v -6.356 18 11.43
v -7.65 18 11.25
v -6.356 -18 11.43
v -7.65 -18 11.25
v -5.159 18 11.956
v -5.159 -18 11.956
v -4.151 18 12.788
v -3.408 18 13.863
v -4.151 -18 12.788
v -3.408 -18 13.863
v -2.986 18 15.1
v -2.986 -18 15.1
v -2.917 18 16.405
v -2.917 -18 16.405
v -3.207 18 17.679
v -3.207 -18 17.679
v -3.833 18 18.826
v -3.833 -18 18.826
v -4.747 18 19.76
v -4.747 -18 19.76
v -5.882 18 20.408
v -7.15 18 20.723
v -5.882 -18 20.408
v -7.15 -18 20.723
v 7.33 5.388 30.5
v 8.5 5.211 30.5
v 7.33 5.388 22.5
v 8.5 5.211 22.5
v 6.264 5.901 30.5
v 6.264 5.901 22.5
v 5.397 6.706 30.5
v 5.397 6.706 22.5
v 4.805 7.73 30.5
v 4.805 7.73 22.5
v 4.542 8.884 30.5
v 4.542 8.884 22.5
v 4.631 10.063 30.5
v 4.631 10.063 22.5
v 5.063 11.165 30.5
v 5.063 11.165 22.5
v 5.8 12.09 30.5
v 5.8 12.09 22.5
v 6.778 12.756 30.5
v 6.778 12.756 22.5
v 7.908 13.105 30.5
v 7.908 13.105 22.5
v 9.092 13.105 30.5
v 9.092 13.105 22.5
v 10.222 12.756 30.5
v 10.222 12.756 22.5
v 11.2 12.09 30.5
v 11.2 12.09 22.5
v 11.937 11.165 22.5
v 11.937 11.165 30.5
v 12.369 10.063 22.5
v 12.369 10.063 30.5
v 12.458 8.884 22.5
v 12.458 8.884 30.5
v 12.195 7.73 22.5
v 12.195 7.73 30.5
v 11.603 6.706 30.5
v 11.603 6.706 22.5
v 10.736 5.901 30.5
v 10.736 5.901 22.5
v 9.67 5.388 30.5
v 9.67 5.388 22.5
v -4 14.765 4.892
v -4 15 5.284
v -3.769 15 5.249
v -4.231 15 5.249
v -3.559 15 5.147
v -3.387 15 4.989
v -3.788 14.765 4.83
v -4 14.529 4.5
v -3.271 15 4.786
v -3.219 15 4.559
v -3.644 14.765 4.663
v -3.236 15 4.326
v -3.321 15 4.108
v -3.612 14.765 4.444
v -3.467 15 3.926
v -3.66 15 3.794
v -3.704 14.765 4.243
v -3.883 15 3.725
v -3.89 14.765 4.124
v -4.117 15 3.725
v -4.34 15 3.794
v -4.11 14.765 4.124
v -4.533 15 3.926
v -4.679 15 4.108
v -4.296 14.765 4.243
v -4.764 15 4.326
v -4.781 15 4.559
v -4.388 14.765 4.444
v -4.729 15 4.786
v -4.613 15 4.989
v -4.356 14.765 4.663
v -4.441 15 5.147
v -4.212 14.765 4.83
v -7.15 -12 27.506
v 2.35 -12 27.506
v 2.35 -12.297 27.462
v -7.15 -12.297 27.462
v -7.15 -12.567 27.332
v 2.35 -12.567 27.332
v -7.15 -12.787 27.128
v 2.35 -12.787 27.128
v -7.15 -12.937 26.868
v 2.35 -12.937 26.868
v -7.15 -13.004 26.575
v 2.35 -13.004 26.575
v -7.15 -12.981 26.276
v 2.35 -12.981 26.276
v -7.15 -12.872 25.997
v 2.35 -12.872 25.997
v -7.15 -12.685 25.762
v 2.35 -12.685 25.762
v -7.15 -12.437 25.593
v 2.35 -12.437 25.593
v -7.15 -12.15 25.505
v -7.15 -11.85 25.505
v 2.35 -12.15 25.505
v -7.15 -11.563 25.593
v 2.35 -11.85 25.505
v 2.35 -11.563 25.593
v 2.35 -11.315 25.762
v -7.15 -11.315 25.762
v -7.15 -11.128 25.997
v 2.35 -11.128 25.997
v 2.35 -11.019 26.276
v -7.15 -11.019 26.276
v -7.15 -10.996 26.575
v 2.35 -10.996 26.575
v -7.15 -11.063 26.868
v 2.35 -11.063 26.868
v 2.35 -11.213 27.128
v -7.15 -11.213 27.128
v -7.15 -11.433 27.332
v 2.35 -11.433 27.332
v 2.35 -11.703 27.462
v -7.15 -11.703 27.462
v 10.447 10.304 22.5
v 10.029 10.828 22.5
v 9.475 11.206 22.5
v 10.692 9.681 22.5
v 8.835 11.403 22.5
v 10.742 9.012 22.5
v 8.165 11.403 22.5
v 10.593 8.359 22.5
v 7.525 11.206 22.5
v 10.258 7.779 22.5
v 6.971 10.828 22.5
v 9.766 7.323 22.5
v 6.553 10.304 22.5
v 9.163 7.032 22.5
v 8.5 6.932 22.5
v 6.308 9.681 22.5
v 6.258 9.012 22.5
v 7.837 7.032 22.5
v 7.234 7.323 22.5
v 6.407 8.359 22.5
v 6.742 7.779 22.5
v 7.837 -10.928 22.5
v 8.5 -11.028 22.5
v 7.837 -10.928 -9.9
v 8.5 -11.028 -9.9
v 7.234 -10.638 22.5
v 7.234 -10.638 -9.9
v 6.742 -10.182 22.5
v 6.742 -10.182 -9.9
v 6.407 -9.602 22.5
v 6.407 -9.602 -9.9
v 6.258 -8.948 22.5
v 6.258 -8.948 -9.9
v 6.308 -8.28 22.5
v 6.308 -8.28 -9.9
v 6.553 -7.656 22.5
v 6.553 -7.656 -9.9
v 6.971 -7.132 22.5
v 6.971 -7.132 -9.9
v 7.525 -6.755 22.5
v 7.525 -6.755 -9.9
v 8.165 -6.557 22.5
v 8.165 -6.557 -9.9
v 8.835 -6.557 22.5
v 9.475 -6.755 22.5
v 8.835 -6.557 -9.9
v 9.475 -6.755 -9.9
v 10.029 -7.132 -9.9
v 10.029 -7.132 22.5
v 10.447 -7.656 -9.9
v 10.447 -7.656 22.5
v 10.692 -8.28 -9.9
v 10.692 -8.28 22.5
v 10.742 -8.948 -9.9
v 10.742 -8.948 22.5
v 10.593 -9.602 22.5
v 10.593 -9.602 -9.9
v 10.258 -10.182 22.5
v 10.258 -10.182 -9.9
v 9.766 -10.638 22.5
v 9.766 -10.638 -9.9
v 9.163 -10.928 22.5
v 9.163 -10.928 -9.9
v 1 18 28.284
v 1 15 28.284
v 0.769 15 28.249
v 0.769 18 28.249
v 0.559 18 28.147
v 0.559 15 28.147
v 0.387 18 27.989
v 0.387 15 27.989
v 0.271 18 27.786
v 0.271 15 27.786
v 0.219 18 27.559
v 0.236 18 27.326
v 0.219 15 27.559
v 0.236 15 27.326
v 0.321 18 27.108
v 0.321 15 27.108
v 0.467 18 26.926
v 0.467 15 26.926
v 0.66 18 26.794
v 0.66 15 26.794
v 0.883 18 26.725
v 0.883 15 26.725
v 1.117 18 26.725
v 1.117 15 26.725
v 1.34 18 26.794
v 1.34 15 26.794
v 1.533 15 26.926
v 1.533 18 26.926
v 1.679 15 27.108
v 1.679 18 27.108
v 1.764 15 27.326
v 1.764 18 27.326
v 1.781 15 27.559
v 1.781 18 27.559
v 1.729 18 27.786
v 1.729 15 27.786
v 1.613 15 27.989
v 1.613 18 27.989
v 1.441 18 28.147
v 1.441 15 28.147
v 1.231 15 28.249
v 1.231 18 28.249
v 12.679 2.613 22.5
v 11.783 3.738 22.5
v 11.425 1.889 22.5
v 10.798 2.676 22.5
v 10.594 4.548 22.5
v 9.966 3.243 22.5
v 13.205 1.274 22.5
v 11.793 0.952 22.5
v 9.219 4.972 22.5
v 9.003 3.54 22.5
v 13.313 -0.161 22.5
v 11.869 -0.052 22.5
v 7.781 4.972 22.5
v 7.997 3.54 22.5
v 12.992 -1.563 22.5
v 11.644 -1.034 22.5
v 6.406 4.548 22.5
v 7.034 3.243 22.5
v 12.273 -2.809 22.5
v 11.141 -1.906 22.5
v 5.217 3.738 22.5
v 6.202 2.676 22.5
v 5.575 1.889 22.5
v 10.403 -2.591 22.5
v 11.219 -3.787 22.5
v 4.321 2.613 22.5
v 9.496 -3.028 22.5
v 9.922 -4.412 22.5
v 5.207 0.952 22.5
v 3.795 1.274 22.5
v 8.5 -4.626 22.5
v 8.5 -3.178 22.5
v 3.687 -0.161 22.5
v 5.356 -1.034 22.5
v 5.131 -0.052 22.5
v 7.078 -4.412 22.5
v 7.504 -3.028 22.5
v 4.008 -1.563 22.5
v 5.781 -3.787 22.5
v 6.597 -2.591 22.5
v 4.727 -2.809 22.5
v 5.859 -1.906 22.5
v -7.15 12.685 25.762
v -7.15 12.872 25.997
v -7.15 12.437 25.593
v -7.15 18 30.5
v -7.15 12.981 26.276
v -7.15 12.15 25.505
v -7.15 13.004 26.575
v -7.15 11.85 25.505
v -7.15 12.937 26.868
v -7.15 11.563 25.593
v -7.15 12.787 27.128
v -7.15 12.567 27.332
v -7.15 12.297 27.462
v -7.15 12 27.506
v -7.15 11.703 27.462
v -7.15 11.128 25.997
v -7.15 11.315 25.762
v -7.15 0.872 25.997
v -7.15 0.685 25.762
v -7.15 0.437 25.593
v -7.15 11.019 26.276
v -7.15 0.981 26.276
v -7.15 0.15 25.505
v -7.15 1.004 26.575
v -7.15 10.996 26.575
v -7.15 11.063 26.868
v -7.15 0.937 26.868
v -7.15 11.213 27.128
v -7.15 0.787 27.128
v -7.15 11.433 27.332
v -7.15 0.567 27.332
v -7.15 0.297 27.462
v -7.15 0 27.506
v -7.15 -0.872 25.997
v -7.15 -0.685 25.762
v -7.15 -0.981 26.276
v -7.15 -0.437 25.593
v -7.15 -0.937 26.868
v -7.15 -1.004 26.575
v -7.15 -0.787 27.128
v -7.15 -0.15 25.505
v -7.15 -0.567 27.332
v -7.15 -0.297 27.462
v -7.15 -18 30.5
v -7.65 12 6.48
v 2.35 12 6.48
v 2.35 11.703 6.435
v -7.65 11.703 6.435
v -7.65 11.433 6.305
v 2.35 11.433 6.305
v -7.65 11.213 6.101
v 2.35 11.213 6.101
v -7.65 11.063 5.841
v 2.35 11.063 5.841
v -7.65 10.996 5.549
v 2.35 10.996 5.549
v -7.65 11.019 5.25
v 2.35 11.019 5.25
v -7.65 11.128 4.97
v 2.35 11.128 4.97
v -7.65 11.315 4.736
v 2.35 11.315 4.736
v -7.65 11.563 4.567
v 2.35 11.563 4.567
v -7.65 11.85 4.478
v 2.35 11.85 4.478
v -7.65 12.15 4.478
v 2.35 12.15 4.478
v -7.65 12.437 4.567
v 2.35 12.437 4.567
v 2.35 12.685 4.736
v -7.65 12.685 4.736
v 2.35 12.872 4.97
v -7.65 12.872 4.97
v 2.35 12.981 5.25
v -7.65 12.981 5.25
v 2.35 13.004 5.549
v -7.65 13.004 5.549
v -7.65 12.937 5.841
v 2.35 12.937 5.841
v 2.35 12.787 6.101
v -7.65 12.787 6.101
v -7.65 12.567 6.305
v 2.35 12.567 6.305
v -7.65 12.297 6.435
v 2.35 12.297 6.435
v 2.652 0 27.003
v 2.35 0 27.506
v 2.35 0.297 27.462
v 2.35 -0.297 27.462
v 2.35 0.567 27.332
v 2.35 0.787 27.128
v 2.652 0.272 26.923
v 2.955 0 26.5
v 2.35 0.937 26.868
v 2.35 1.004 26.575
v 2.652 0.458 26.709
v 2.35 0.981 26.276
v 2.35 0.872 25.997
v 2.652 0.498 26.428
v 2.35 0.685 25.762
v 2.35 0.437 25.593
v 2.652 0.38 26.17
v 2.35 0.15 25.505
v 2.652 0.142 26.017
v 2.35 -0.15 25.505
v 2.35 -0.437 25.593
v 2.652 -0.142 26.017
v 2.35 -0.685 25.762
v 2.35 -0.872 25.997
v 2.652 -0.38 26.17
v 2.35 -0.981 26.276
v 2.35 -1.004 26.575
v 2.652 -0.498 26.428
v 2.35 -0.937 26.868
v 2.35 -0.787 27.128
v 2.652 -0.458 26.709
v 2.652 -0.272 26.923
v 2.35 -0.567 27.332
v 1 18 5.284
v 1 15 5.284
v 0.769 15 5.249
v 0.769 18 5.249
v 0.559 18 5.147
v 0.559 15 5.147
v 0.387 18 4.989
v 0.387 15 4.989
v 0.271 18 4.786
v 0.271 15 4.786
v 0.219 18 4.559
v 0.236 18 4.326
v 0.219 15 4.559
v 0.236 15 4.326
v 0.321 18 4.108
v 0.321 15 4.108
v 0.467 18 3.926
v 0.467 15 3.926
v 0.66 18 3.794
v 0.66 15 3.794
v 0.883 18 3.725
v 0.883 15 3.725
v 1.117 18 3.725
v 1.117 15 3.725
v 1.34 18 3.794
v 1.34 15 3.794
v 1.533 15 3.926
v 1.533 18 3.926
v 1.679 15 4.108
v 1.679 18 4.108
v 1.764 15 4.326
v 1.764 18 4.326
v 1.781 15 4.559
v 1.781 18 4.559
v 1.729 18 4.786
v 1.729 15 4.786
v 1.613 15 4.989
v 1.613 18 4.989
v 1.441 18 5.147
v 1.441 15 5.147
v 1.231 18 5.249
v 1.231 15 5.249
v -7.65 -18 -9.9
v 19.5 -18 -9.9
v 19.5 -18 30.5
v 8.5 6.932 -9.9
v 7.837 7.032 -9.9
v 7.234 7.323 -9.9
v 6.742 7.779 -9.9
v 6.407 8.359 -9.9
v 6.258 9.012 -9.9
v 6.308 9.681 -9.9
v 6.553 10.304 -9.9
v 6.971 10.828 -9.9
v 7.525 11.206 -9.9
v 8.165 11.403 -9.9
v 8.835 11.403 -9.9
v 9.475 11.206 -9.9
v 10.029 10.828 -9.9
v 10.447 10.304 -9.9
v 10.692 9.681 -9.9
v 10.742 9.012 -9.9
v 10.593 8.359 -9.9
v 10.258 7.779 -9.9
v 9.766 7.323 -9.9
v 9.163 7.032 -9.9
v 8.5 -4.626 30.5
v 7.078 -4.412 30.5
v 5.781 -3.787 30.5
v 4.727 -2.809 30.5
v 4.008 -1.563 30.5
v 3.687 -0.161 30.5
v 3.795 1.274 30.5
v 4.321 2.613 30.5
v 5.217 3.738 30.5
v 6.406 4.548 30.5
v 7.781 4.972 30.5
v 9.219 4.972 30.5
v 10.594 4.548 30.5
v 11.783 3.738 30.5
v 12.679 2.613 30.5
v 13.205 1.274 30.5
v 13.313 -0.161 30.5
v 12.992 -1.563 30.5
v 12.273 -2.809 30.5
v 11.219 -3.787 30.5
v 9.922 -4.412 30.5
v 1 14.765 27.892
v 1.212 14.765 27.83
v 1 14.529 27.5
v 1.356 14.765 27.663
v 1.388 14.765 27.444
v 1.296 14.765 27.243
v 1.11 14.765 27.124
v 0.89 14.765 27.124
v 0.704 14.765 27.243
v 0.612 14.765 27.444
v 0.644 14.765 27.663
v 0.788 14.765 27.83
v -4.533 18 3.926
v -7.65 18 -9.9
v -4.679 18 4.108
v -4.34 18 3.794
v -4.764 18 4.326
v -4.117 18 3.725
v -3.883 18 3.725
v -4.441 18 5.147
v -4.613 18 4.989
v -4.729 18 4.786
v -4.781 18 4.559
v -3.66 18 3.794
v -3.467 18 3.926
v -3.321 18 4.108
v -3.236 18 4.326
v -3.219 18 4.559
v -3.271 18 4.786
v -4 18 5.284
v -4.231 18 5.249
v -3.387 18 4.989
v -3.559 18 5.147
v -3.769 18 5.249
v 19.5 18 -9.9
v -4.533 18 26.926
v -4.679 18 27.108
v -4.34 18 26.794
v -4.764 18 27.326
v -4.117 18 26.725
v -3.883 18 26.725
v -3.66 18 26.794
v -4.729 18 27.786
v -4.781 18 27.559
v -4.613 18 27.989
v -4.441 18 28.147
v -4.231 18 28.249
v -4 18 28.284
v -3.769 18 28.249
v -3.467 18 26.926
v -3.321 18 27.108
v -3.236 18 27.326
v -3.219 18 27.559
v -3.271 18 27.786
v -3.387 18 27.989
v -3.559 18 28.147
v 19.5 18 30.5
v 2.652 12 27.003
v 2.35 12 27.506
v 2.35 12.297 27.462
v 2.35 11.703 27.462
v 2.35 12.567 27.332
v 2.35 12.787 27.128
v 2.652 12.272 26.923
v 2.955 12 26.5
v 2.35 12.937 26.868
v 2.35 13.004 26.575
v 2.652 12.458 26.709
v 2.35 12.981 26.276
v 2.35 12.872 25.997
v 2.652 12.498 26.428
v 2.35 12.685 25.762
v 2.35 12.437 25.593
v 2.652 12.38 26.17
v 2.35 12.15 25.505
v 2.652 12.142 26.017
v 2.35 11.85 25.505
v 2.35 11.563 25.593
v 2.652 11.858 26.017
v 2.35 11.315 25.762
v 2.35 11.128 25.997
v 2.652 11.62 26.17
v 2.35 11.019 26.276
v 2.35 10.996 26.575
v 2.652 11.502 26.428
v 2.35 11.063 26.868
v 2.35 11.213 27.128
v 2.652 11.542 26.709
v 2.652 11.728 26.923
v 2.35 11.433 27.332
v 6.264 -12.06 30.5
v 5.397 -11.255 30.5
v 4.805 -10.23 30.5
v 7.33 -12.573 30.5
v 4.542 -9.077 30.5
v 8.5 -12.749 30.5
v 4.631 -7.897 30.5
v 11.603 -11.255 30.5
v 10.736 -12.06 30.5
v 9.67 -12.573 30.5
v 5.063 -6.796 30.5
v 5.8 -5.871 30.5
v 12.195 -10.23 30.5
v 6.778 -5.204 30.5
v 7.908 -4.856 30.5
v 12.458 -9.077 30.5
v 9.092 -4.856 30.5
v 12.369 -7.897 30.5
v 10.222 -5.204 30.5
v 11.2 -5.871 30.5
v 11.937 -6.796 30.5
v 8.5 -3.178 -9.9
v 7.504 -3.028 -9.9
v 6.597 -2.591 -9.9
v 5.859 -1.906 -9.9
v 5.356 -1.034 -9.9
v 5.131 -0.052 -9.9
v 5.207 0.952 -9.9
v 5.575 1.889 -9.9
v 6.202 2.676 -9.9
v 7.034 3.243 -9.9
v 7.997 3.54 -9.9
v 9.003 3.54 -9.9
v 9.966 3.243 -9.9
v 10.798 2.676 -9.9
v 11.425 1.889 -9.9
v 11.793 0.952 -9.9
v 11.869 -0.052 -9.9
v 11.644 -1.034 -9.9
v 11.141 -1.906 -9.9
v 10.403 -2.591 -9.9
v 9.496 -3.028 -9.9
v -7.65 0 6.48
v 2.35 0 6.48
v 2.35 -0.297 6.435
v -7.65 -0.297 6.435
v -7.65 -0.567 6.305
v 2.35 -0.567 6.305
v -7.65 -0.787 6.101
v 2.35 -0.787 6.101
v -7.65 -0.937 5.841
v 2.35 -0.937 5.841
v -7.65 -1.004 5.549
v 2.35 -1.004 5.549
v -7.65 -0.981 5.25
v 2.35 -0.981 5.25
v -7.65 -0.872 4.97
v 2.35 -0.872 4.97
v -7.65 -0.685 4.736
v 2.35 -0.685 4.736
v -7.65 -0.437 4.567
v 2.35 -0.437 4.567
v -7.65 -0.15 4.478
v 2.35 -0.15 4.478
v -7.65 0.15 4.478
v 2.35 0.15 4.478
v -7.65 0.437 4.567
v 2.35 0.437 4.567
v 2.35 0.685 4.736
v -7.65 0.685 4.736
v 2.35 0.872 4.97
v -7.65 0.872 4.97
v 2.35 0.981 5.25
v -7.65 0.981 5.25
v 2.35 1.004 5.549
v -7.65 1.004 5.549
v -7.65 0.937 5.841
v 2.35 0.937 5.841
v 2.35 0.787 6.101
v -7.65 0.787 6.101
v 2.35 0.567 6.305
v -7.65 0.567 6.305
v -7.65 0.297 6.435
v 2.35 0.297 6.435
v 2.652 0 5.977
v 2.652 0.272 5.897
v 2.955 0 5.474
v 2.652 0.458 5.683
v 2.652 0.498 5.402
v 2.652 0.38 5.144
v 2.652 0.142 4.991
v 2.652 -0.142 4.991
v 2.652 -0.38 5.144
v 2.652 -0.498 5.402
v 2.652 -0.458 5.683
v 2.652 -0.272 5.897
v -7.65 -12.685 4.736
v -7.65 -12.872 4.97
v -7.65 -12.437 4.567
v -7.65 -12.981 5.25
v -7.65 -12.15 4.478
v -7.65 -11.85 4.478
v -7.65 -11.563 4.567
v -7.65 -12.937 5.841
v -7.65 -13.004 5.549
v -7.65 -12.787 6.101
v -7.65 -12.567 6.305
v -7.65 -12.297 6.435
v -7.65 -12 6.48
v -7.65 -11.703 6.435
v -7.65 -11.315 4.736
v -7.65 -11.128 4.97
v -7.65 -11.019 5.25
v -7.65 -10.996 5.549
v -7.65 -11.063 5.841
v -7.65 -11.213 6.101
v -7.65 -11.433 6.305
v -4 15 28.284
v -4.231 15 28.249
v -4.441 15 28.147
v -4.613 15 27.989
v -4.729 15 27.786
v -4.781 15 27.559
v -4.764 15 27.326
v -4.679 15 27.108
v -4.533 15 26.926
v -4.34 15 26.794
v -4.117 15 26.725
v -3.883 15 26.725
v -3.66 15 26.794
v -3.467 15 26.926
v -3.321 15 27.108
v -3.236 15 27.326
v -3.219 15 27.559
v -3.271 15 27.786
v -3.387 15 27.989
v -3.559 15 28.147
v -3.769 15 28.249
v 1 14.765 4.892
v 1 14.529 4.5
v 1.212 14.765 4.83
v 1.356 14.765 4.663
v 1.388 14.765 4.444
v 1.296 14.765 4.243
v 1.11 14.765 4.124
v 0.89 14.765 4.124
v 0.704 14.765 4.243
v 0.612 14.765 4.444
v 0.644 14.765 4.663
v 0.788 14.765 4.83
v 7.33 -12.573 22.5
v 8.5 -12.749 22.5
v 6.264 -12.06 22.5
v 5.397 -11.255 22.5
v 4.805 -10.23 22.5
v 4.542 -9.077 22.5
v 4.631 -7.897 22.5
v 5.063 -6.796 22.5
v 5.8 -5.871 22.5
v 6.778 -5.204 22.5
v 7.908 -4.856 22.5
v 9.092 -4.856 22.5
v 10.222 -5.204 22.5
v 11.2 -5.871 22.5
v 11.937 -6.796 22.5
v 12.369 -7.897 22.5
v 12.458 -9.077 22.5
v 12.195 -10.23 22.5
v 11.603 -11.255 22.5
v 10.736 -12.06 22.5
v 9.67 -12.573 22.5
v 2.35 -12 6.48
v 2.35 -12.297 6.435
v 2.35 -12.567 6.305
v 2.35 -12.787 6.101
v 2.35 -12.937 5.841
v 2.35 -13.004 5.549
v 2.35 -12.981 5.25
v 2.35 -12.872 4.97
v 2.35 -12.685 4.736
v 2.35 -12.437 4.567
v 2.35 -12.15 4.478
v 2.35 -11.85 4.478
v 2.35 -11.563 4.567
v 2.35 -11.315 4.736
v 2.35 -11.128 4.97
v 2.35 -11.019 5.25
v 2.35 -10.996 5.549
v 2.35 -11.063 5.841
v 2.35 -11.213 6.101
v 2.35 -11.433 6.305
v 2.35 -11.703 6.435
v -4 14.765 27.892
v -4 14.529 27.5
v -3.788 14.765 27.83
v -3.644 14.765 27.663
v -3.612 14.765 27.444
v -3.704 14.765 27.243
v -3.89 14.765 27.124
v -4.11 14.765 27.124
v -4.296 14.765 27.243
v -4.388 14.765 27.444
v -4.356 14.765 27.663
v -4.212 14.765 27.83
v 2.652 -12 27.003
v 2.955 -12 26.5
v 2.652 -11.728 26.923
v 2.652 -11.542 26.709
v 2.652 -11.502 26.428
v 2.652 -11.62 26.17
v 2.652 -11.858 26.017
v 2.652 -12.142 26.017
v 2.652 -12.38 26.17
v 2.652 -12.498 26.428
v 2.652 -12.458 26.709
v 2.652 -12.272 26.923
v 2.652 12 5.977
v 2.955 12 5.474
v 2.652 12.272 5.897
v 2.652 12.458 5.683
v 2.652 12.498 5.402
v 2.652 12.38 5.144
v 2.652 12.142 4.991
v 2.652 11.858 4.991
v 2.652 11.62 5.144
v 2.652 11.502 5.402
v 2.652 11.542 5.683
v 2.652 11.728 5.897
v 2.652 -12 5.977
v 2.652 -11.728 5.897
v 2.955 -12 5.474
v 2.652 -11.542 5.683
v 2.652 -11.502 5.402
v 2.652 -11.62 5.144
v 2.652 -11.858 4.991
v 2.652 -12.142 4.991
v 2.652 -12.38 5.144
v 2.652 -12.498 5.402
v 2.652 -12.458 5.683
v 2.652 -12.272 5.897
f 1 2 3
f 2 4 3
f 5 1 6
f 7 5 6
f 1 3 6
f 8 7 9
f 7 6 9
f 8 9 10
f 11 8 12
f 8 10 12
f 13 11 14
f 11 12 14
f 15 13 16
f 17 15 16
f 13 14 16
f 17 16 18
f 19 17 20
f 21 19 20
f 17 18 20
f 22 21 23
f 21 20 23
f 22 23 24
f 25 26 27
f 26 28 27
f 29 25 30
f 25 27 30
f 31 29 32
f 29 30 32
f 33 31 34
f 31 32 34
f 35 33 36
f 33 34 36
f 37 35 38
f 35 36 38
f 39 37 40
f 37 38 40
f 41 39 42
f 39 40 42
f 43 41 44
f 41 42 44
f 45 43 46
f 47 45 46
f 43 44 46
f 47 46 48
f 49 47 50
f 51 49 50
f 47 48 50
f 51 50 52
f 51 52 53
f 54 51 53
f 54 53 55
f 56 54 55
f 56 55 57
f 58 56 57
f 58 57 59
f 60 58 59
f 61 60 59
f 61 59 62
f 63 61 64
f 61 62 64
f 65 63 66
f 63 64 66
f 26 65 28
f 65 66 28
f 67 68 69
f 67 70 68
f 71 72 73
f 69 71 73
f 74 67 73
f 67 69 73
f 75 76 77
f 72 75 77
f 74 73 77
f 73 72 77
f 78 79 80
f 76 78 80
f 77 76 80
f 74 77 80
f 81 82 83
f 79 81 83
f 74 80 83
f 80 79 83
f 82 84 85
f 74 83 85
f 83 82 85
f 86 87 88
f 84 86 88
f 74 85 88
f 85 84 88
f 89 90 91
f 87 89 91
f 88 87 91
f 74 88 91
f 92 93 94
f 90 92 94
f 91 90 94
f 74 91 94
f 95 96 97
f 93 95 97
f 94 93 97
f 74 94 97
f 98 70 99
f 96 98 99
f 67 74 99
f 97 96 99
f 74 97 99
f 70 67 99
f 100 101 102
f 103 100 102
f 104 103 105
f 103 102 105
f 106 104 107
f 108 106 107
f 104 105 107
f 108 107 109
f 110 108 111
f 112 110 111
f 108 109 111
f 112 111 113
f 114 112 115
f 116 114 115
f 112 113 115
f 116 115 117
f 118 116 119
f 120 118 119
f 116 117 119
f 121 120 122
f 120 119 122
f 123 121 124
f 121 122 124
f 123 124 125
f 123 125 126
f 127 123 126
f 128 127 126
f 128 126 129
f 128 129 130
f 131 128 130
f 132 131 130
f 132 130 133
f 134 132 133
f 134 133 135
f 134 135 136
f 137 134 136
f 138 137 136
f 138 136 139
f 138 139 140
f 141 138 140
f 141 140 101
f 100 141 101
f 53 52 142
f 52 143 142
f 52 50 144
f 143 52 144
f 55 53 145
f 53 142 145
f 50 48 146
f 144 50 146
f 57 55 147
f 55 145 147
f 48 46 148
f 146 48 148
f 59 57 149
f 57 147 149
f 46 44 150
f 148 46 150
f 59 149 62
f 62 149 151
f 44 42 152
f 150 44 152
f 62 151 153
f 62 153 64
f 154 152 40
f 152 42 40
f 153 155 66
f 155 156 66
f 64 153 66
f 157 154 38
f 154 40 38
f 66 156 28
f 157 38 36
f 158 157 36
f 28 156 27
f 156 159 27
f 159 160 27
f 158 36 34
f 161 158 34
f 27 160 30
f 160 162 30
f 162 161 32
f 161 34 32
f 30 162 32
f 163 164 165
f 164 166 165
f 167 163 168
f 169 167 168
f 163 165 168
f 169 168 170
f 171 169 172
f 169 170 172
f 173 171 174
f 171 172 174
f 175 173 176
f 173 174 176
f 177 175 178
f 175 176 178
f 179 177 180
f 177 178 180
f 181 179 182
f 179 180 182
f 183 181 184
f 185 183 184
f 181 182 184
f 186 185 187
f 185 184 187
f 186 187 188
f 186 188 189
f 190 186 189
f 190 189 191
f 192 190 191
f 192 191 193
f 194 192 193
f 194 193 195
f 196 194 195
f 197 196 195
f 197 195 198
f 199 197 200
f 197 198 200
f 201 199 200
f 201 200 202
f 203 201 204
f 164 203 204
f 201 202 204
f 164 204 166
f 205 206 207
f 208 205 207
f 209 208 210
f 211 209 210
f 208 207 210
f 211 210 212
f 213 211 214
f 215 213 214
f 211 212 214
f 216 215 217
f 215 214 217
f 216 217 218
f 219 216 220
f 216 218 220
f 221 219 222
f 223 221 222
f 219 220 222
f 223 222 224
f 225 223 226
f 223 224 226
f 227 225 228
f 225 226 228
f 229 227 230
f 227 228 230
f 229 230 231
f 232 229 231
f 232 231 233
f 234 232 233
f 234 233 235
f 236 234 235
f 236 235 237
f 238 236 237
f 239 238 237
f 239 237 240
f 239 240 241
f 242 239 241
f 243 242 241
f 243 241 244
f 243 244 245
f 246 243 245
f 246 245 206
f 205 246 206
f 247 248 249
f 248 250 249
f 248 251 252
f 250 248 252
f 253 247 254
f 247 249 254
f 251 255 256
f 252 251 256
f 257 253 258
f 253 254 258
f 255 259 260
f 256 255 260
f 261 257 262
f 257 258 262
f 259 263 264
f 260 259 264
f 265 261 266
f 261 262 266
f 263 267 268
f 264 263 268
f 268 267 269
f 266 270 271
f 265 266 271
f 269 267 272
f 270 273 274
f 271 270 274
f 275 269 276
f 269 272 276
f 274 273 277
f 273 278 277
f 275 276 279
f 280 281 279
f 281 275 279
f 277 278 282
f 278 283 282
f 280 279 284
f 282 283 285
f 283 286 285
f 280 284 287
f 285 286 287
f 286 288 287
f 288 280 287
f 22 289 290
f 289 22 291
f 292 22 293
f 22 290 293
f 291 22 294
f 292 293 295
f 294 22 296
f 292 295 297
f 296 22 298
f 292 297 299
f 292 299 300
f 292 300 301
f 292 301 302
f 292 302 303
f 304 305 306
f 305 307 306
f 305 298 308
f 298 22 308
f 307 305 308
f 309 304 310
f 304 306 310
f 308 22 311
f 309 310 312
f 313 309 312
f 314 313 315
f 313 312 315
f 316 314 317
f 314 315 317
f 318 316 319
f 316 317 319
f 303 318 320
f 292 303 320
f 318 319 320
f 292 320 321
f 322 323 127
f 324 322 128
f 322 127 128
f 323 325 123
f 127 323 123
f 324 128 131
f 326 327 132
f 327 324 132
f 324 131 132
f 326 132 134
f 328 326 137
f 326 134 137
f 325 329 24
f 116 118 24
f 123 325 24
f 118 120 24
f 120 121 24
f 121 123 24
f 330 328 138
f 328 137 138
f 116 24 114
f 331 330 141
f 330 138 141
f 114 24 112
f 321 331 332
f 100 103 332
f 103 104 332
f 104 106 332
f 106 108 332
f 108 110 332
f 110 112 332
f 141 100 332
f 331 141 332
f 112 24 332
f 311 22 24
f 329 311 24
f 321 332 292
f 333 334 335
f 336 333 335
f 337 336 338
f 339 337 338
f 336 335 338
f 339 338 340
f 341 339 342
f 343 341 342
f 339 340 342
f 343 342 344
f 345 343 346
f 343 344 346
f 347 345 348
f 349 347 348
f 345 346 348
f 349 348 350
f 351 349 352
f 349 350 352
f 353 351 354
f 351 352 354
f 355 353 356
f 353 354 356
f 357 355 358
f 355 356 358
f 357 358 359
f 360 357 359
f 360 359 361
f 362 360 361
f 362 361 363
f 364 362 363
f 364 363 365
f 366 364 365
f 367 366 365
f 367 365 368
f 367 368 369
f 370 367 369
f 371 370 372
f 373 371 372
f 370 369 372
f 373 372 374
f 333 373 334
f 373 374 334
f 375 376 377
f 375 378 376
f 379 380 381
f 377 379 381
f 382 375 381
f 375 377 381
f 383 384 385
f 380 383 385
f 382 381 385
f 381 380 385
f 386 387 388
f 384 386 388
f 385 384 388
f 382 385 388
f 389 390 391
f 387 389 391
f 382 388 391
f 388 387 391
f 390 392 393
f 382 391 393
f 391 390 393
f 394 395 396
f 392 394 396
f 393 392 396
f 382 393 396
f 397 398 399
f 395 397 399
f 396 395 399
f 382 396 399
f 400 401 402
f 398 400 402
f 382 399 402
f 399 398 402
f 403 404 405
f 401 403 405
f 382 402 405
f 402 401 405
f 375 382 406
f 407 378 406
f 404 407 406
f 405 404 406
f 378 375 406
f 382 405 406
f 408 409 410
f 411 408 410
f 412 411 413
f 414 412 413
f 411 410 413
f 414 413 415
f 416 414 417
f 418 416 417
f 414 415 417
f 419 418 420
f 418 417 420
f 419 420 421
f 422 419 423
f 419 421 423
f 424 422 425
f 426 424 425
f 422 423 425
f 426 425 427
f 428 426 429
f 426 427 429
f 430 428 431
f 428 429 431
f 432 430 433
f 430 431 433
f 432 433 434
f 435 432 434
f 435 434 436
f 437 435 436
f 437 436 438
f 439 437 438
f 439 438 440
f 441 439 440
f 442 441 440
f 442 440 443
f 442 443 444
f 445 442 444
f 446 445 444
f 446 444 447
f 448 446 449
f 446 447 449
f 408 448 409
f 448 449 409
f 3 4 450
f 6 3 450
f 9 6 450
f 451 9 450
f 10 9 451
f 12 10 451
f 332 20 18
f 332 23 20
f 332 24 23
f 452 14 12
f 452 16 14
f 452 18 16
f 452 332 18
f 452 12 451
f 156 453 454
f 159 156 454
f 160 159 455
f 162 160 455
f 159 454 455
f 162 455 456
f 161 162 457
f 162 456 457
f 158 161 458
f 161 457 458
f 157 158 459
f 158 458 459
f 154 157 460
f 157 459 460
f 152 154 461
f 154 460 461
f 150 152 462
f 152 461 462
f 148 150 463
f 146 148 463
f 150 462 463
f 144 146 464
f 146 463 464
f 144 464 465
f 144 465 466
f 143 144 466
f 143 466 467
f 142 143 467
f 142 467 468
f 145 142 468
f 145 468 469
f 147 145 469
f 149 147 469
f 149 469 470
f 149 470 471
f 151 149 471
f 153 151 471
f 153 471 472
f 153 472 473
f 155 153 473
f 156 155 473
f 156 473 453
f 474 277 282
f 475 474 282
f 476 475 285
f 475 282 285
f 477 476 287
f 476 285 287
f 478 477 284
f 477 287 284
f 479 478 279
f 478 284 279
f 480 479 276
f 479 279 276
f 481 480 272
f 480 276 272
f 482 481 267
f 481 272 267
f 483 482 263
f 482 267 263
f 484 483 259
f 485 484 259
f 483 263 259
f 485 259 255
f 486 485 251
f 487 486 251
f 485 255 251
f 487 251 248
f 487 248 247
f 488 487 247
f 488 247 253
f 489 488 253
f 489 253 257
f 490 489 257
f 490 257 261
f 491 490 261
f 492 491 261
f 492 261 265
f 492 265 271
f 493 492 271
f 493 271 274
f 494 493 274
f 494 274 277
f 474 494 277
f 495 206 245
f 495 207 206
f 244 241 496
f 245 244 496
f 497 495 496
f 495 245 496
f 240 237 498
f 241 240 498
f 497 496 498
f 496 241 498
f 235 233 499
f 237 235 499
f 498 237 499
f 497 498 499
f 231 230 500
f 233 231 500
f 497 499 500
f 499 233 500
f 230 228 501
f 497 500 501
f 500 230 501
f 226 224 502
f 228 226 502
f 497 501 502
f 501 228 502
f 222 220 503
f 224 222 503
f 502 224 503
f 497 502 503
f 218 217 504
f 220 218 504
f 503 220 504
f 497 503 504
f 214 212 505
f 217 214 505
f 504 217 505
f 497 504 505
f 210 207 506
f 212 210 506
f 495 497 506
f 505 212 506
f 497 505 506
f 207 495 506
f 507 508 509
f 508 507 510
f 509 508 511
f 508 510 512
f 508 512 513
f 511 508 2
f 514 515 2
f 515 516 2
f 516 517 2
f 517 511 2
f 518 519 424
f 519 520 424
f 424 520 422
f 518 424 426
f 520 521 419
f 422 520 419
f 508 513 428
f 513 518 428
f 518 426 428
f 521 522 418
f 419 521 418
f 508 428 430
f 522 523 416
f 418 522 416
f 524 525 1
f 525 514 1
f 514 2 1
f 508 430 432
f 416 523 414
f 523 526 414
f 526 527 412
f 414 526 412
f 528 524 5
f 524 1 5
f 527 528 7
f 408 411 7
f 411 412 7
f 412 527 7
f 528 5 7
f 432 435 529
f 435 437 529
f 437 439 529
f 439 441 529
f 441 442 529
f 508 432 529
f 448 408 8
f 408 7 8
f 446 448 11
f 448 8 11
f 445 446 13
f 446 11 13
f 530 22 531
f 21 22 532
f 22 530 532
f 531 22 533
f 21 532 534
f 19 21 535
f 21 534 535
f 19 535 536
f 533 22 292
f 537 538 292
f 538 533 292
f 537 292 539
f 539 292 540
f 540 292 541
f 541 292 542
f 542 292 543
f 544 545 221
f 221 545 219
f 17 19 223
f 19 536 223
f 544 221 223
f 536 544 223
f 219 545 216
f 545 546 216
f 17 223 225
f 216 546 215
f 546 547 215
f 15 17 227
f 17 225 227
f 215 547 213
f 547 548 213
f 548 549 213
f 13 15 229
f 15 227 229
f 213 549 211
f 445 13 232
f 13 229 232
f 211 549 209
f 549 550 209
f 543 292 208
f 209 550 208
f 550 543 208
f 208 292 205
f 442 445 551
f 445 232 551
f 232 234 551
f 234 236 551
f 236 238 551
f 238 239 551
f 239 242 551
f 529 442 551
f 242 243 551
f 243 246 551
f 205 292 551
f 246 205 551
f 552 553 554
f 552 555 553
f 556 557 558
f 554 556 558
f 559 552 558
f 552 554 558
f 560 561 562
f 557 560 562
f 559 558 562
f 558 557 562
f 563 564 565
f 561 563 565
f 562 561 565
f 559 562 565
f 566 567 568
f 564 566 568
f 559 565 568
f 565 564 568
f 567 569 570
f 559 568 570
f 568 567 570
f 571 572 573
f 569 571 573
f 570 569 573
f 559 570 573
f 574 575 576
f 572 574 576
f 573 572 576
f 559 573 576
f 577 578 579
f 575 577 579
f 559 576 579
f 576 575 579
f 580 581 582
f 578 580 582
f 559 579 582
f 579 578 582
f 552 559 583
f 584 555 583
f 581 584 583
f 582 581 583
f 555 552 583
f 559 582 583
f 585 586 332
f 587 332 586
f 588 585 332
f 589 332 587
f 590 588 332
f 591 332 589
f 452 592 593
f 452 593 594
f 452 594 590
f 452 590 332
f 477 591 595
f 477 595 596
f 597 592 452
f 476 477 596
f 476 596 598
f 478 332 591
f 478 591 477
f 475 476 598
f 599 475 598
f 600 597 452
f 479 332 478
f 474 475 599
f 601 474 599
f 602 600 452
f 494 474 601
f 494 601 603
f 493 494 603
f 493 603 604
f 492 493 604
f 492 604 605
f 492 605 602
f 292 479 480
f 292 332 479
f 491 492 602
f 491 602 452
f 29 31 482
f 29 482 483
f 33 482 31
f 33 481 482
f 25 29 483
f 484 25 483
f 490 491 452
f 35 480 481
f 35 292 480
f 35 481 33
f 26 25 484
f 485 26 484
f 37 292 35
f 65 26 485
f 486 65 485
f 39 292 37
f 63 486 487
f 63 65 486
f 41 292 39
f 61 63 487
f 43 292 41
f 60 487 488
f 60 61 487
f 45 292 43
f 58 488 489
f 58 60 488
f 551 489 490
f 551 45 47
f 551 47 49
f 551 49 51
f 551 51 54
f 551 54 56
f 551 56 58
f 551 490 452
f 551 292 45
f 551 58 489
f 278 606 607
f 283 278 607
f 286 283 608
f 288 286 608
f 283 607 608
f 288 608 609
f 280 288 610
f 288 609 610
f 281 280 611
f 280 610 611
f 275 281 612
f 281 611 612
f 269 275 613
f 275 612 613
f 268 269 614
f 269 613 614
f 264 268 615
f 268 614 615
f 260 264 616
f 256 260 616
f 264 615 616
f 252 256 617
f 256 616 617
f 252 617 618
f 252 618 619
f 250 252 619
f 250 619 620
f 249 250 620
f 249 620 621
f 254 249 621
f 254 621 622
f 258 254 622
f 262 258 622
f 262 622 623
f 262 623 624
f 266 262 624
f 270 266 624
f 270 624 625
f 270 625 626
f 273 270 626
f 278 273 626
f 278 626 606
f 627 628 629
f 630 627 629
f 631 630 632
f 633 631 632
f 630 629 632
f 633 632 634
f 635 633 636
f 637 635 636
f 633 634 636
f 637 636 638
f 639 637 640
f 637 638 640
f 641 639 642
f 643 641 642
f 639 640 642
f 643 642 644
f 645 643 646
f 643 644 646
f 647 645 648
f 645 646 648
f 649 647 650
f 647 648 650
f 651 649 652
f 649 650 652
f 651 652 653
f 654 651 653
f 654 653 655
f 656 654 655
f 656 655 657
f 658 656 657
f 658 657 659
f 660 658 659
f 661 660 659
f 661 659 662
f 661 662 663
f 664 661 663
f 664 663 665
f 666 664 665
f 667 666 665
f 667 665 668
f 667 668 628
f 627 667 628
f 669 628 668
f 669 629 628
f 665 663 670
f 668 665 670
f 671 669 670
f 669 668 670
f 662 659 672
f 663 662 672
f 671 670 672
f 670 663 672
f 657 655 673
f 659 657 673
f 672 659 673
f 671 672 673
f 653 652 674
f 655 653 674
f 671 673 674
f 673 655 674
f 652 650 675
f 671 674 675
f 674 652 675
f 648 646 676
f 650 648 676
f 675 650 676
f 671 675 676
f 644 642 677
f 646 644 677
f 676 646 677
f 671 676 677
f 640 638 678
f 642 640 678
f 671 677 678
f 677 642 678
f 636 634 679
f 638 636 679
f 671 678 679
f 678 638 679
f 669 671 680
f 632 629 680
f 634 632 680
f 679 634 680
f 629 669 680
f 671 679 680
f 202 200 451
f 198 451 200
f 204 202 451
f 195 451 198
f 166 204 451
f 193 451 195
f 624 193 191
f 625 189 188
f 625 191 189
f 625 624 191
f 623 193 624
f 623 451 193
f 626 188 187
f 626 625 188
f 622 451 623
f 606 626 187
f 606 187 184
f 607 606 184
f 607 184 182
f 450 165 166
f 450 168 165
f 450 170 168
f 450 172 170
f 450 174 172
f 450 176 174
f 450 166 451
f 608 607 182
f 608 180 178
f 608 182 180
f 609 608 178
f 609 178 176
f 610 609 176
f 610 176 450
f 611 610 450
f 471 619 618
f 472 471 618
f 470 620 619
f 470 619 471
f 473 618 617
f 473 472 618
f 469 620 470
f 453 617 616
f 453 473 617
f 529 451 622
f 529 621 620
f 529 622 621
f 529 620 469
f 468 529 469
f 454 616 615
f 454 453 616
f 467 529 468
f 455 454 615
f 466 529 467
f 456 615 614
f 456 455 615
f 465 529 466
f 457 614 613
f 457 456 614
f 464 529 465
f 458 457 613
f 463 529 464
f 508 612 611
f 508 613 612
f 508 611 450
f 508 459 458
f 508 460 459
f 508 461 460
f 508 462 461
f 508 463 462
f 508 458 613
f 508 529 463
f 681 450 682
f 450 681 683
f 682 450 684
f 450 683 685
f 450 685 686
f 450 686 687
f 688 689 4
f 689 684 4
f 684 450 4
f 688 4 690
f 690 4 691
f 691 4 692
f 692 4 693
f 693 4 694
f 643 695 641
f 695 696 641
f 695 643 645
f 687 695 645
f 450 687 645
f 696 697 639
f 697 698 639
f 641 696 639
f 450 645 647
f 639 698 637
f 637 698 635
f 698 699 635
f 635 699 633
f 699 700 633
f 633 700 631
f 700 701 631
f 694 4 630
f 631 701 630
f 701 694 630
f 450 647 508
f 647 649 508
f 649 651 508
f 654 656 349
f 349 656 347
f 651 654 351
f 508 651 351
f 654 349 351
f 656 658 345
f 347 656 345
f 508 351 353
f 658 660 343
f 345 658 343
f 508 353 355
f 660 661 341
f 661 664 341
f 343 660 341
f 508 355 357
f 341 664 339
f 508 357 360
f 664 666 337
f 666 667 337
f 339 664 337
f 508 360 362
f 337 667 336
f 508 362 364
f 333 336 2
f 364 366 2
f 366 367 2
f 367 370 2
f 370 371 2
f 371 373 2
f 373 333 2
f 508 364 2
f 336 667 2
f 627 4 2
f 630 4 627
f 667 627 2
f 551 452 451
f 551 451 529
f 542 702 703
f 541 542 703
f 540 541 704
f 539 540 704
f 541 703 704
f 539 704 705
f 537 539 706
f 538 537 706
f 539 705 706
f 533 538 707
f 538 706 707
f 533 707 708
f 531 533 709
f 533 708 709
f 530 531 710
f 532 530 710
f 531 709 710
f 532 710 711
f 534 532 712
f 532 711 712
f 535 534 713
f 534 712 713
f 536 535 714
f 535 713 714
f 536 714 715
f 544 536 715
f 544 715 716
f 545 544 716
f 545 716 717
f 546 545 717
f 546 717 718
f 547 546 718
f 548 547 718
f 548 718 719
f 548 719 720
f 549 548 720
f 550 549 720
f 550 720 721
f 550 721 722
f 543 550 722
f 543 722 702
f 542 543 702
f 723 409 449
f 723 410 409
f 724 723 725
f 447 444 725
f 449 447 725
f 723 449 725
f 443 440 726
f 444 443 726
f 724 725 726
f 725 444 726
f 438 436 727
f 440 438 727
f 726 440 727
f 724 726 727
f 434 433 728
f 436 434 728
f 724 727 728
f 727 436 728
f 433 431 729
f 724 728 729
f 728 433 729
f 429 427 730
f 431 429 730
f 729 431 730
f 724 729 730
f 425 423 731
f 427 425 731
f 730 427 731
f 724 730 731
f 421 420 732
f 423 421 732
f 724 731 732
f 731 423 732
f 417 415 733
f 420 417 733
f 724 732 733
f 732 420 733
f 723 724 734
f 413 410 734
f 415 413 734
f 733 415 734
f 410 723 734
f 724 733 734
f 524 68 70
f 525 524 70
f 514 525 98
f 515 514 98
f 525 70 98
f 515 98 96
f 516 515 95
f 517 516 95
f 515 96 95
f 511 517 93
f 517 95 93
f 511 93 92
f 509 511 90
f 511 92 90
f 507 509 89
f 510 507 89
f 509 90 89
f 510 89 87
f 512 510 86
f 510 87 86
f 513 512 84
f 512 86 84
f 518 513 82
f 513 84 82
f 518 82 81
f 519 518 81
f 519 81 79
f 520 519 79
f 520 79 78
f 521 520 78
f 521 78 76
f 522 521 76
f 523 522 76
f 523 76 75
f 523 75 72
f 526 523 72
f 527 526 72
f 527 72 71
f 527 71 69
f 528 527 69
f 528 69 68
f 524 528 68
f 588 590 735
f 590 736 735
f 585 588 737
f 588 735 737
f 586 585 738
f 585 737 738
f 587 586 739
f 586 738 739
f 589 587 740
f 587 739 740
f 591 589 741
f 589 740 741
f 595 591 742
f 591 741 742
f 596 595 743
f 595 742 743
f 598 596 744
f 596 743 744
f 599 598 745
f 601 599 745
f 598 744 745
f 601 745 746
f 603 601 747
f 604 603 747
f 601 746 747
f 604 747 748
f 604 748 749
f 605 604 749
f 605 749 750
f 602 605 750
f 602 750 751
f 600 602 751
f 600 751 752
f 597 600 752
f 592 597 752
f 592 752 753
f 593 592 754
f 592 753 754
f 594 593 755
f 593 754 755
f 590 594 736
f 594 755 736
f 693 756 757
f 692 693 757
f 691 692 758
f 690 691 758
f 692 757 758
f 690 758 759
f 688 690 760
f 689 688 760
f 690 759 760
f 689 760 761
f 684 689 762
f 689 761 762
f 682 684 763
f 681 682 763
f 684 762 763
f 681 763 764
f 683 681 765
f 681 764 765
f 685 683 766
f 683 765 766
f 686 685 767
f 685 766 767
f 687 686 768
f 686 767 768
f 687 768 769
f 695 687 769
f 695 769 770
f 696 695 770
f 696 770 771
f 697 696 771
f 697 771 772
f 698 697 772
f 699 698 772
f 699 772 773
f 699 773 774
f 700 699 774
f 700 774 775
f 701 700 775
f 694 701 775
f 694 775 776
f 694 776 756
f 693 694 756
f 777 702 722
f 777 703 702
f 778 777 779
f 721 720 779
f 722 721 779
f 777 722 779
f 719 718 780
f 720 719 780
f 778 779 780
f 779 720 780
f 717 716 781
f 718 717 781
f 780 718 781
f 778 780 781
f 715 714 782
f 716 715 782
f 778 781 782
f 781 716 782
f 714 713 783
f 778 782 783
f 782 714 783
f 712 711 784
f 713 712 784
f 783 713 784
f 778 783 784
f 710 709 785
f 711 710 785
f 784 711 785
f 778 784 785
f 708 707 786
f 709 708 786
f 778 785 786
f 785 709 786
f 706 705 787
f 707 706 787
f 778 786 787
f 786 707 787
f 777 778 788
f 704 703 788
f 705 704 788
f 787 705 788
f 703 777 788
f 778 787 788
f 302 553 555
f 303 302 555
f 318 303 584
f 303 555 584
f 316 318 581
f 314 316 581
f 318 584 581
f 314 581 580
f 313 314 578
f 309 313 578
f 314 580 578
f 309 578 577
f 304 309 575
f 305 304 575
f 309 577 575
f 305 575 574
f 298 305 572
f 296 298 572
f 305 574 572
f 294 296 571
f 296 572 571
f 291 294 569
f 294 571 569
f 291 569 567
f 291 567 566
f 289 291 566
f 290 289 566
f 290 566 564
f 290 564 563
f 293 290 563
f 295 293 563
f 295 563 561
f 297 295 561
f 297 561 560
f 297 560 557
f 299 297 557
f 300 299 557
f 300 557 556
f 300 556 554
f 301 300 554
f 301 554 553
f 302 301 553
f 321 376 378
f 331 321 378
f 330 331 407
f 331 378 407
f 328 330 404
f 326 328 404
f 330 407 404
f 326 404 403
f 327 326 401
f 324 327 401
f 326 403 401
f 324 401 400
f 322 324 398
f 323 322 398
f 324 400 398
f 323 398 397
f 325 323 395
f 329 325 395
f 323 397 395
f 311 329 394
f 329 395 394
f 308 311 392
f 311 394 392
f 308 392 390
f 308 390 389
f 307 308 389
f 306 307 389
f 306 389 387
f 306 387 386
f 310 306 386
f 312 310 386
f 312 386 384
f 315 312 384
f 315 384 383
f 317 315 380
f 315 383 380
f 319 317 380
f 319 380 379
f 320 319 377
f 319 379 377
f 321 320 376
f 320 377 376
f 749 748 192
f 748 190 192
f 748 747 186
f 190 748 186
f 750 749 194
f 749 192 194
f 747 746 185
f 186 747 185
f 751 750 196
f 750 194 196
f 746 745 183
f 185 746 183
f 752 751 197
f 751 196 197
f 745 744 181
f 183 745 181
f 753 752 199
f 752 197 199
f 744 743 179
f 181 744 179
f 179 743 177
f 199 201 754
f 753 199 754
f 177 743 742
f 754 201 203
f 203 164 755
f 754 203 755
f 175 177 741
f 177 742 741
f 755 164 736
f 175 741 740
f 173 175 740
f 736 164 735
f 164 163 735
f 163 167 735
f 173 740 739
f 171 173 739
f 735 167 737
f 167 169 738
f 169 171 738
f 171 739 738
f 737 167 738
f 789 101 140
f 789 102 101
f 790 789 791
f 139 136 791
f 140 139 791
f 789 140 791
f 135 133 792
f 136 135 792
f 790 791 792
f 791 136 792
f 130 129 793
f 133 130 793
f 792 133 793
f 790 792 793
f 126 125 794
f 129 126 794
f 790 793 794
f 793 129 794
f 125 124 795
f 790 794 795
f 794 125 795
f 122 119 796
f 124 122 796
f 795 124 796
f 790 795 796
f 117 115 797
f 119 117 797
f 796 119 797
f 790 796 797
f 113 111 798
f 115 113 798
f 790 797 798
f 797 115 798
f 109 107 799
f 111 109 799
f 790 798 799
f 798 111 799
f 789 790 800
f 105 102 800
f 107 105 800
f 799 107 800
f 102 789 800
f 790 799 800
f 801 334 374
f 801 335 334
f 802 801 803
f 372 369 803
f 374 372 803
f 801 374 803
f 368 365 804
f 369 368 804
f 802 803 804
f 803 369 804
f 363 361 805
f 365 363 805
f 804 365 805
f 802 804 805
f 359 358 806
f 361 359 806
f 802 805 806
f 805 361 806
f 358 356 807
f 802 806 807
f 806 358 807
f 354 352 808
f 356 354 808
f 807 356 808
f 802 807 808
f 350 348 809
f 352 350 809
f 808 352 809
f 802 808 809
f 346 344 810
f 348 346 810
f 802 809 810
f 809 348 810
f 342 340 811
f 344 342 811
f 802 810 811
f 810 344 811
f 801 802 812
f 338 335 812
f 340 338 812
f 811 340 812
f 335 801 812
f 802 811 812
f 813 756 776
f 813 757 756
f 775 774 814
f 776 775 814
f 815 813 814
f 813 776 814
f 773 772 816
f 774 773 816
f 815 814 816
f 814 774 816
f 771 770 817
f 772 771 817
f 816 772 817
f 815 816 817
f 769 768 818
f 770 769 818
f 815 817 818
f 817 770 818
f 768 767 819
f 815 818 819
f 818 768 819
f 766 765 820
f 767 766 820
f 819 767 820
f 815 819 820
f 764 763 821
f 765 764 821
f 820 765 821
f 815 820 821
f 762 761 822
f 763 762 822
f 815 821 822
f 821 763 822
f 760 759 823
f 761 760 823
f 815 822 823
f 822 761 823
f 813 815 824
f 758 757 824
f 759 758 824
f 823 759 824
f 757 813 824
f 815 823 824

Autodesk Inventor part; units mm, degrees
ref_plane "YZ Plane" through (0, 0, 0) normal (1, 0, 0) x (0, 1, 0)
ref_plane "XZ Plane" through (0, 0, 0) normal (0, 1, 0) x (-1, 0, 0)
ref_plane "XY Plane" through (0, 0, 0) normal (0, 0, 1) x (1, 0, 0)
sketch "Sketch1" plane through (0, 0, 0) normal (0, 0, 1) x (1, 0, 0)
  line L0 (-15.5, 18) -> (19.5, 18)
  line L1 (19.5, 18) -> (19.5, -18)
  line L2 (19.5, -18) -> (-15.5, -18)
  line L3 (-15.5, -18) -> (-15.5, 18)
  point P0 (0, 0)
  dimension "d0" = 35
  dimension "d1" = 36
  dimension "d2" = 18
  dimension "d3" = 15.5
extrude "Extrusion1" add sketch "Sketch1" along normal blind 8
sketch "Sketch2" plane through (0, 0, 8) normal (0, 0, 1) x (1, 0, 0)
  line L0 (-15.5, 18) -> (19.5, 18)
  line L1 (19.5, 18) -> (19.5, -18)
  line L2 (19.5, -18) -> (-15.5, -18)
  line L3 (-15.5, -18) -> (-15.5, 18)
  line L4 (-15.5, -18) -> (-15.5, 18) projected
  line L5 (19.5, 18) -> (19.5, -18) projected
  line L6 (-15.5, 18) -> (19.5, 18) projected
  line L7 (19.5, -18) -> (-15.5, -18) projected
  line L8 (19.5, -18) -> (19.5, 18)
  point P0 (0, 0)
  dimension "d70" = 0
  dimension "d165" = 0
extrude "Extrusion2" add sketch "Sketch2" along normal blind 22.5
sketch "Sketch3" plane through (-15.5, -18, 0) normal (0, -1, 0) x (1, 0, 0)
  line L0 (7.85, 30.5) -> (7.35, 30.5)
  line L1 (7.85, 30.5) -> (8.35, 30.5)
  line L2 (35, 0) -> (0, 0) projected
  arc A0 (7.35, 20.7234) -> (8.35, 20.7234) centre (7.85, 16) ccw
  line L3 (7.35, 30.5) -> (7.35, 20.7234)
  line L4 (8.35, 30.5) -> (8.35, 20.7234)
  line L5 (35, 0) -> (35, 30.5) projected
  line L6 (35, 30.5) -> (0, 30.5) projected
  line L7 (0, 0) -> (0, 30.5) projected
  point P0 (15.5, 0)
  dimension "d16" = 0.5
  dimension "d17" = 0.5
  dimension "d63" = 9.4996
  dimension "d65" = 16
  dimension "d105" = 1
  dimension "d188" = 7.85
  dimension "d189" = 0.5
emboss "Emboss1" sketch "Sketch3" operation cut depth 50 direction (0, 1, 0) contours L1 L4 A0 L3 L0
sketch "Sketch13" plane through (0, 0, 0) normal (0, 0, -1) x (-1, 0, 0)
  line L0 (-13, -5.3) -> (11, -5.3)
  line L1 (15.5, 18) -> (-19.5, 18) projected
  line L2 (-19.5, 18) -> (-19.5, -18) projected
  line L3 (-19.5, -18) -> (15.5, -18) projected
  line L4 (15.5, -18) -> (15.5, 18) projected
  line L5 (-19.5, 18) -> (-19.5, -18) projected
  line L6 (-19.5, -5.3) -> (15.5, -5.3)
  point P0 (0, 0)
  dimension "d190" = 12.7
extrude "Extrusion5" [suppressed]
sketch "Sketch14" plane through (-15.5, -5.3, 0) normal (0, 1, 0) x (1, 0, 0)
  line L0 (0, 32) -> (35, 32) projected
  line L1 (35, 0) -> (35, 32) projected
  point P0 (15.5, 0)
  point P1 (9.5, 30)
  point P2 (28, 30)
  point P3 (32.75, 16)
  dimension "d109" = 2
  dimension "d110" = 2
  dimension "d111" = 2.25
  dimension "d112" = 9.5
  dimension "d113" = 7
  dimension "d114" = 16
hole "Press fit for D2mm_L5mm Dowel - pin to protrude 2mm" [suppressed]
sketch "Sketch21" plane through (0, 0, 0) normal (0, 0, -1) x (-1, 0, 0)
  circle A0 centre (-3.75, 0.2) radius 3
  circle A1 centre (-3.75, 0.2) radius 3 construction
  point P0 (0, 0)
  dimension "d185" = 6
sketch "Sketch22" plane through (-15.5, -18, 30.5) normal (-1, 0, 0) x (0, 0, 1)
  line L0 (-30.5, 36) -> (0, 36) projected
  line L1 (-30.5, 0) -> (-30.5, 36) projected
  line L2 (-30.5, 0) -> (0, 0) projected
  line L3 (0, 0) -> (0, 36) projected
  point P0 (-30.5, 18)
  point P1 (-4, 30)
  point P2 (-4, 18)
  point P3 (-4, 6)
  dimension "d191" = 4
  dimension "d192" = 4
  dimension "d193" = 4
  dimension "d194" = 6
  dimension "d195" = 6
  dimension "d196" = 18
hole "CBore for M2.5 screw" [suppressed]
sketch "Sketch24" plane through (-7.65, -18, 16) normal (0, -1, 0) x (1, 0, 0)
  circle A0 centre (21.4, -42.5) radius 0.7835
  circle A1 centre (21.4, -22.5) radius 0.7835
  circle A2 centre (1.4, -42.5) radius 0.7835
  circle A3 centre (1.4, -22.5) radius 0.7835
  point P0 (7.65, -16)
hole "CBore for M2 screw" [suppressed]
sketch "Sketch25" plane through (-7.65, -18, 16) normal (0, -1, 0) x (1, 0, 0)
  line L0 (-0.5, 4.7234) -> (-0.5, 14.5) projected
  line L1 (-0.5, 14.5) -> (-7.85, 14.5) projected
  line L2 (-7.85, -16) -> (-7.85, 14.5) projected
  line L3 (27.15, -16) -> (27.15, 14.5) projected
  line L4 (27.15, 14.5) -> (0.5, 14.5) projected
  line L5 (0.5, 14.5) -> (0.5, 4.7234) projected
  arc A0 (-0.5, 4.7234) -> (0.5, 4.7234) centre (0, 0) ccw projected
  line L6 (27.15, -48) -> (-7.85, -48) projected
  circle A1 centre (1.4, -42.5) radius 2.2 projected
  circle A2 centre (21.4, -42.5) radius 1.2 projected
  line L7 (1.4, -42.5) -> (21.4, -42.5) construction
  line L8 (11.4, -42.5) -> (11.4, 14.5) construction
  line L9 (0.5, 14.5) -> (27.15, 14.5) projected
  line L10 (27.15, -16) -> (-7.85, -16) projected
  point P0 (7.65, -16)
  point P1 (11.4, -23)
  point P2 (11.4, -40)
hole "Threaded hole for M2 screw" [suppressed]
sketch "Sketch27" plane through (-15.5, 18, 0) normal (0, 1, 0) x (1, 0, 0)
  arc A0 (8.35, -20.7234) -> (7.35, -20.7234) centre (7.85, -16) ccw projected
  line L0 (7.35, -30.5) -> (7.35, -20.7234) projected
  arc A1 (8.35, -20.7234) -> (7.35, -20.7234) centre (7.85, -16) ccw projected
  line L1 (8.35, -20.7234) -> (8.35, -30.5) projected
  line L2 (8.35, -30.5) -> (35, -30.5) projected
  line L3 (35, 0) -> (35, -30.5) projected
  line L4 (0, 0) -> (35, 0) projected
  line L5 (0, 0) -> (0, -30.5) projected
  line L6 (0, -30.5) -> (7.35, -30.5) projected
  line L7 (7.85, -16) -> (7.85, -30.5)
  line L8 (7.85, -30.5) -> (0, -30.5)
  line L9 (0, -30.5) -> (0, 0)
  line L10 (0, 0) -> (7.85, 0)
  line L11 (7.85, 0) -> (7.85, -16)
  point P0 (15.5, 0)
extrude "Extrusion7" cut sketch "Sketch27" against normal through all contours L11 L7 L8 L0 A0 | A0 L0 L6 L5 L4 L11
sketch "Sketch23" plane through (-7.65, -18, 20.7234) normal (-1, 0, 0) x (0, 0, 1)
  line L0 (0, 0) -> (-9.4732, 0) construction
  line L1 (-9.4732, 36) -> (0, 36) construction
  line L2 (-4.7366, 0) -> (-4.7366, 36) construction
  point P0 (-20.7234, 18)
  point P1 (5.7766, 30)
  point P2 (5.7766, 18)
  point P3 (5.7766, 6)
  point P4 (-15.2498, 30)
  point P5 (-15.2498, 18)
  point P6 (-15.2498, 6)
  point P7 (5.7766, 30)
  point P8 (5.7766, 18)
  point P9 (5.7766, 6)
  dimension "d227" = 10.5132
  dimension "d228" = 10.5132
  dimension "d229" = 10.5132
  dimension "d230" = 10.5132
  dimension "d231" = 10.5132
  dimension "d232" = 10.5132
  dimension "d233" = 6
  dimension "d234" = 6
  dimension "d235" = 18
  dimension "d236" = 30
  dimension "d237" = 18
  dimension "d238" = 30
hole "Threaded hole for M2.5 screw" at (-7.65, 12, 26.5) at (-7.65, 0, 26.5) at (-7.65, -12, 26.5) at (-7.65, 12, 5.4736) at (-7.65, 0, 5.4736) at (-7.65, -12, 5.4736) direction (1, 0, 0) diameter 2.013 depth 10 tip angle 118 thread size "M2.5x0.45" class "6H" standard "ANSI Metric M Profile"
sketch "Sketch29" plane through (19.5, 18, 30.5) normal (0, 1, 0) x (1, 0, 0)
  arc A0 (-26.65, 9.7766) -> (-27.15, 19.2498) centre (-27.15, 14.5) ccw projected
  point P0 (-19.5, 30.5)
  point P1 (-23.5, 3)
  point P2 (-18.5, 3)
  point P3 (-23.5, 26)
  point P4 (-18.5, 26)
  dimension "d241" = 11.5
  dimension "d242" = 11.5
  dimension "d243" = 11.5
  dimension "d244" = 11.5
  dimension "d245" = 3.65
  dimension "d246" = 3.65
  dimension "d247" = 8.65
  dimension "d248" = 8.65
hole "Hole18" at (-4, 18, 27.5) at (1, 18, 27.5) at (-4, 18, 4.5) at (1, 18, 4.5) direction (0, -1, 0) diameter 1.567 depth 3 tip angle 118 thread size "M2x0.4" class "6H" standard "ANSI Metric M Profile"
sketch "Sketch31" plane through (0, 0, 0) normal (0, 0, -1) x (-1, 0, 0)
  line L0 (7.65, 18) -> (-19.5, 18) projected
  line L1 (7.65, -18) -> (7.65, 18) projected
  line L2 (-19.5, 18) -> (7.65, 18)
  line L3 (7.65, 18) -> (7.65, -18)
  line L4 (7.65, -18) -> (-19.5, -18)
  line L5 (-19.5, -18) -> (-19.5, 18)
  line L6 (-19.5, 18) -> (7.65, 18)
  line L7 (7.65, 18) -> (7.65, -18)
  line L8 (7.65, -18) -> (-19.5, -18)
  line L9 (-19.5, -18) -> (-19.5, 18)
  point P0 (0, 0)
extrude "Extrusion8" add sketch "Sketch31" along normal blind 9.9003
hole "Hole19" [suppressed]
sketch "Sketch30" plane through (0, 0, 30.5) normal (0, 0, 1) x (1, 0, 0)
  circle A0 centre (8.5, 0.2) radius 3
  line L0 (19.5, 18) -> (19.5, -18) projected
  line L1 (-7.15, 18) -> (19.5, 18) projected
  circle A1 centre (8.5, 9.1803) radius 1.1674
  circle A2 centre (8.5, -8.7803) radius 1.2033
  point P0 (0, 0)
  dimension "d263" = 6
  dimension "d264" = 11
  dimension "d265" = 17.8
  dimension "d273" = 8.9803
  dimension "d274" = 8.9803
hole "Hole20" at (8.5, 0.2, 30.5) direction (0, 0, -1) diameter 6.756 end through all counterbore diameter 9.652 counterbore depth 8 clearance for "Hex Head Bolt" size "1/4" standard "Ansi Unified Screw Threads"
hole "Hole21" at (8.5, 9.1803, 30.5) direction (0, 0, -1) diameter 4.496 end through all counterbore diameter 7.938 counterbore depth 8 clearance for "Socket Head Cap Screw" size "#8" standard "Ansi Unified Screw Threads"
hole "Hole22" at (8.5, -8.7803, 30.5) direction (0, 0, -1) diameter 4.496 end through all counterbore diameter 7.938 counterbore depth 8 clearance for "Socket Head Cap Screw" size "#8" standard "Ansi Unified Screw Threads"
equation "\"d2\" = 0.5 * d1"
equation "\"d230\" = d229"
equation "\"d231\" = d228"
equation "\"d232\" = d227"
equation "\"d233\" = d234"
equation "\"d237\" = d235"
equation "\"d238\" = d236"
properties part number "zgalvo_to_newport_stage" material "ALUMINUM, 6061-T651"
